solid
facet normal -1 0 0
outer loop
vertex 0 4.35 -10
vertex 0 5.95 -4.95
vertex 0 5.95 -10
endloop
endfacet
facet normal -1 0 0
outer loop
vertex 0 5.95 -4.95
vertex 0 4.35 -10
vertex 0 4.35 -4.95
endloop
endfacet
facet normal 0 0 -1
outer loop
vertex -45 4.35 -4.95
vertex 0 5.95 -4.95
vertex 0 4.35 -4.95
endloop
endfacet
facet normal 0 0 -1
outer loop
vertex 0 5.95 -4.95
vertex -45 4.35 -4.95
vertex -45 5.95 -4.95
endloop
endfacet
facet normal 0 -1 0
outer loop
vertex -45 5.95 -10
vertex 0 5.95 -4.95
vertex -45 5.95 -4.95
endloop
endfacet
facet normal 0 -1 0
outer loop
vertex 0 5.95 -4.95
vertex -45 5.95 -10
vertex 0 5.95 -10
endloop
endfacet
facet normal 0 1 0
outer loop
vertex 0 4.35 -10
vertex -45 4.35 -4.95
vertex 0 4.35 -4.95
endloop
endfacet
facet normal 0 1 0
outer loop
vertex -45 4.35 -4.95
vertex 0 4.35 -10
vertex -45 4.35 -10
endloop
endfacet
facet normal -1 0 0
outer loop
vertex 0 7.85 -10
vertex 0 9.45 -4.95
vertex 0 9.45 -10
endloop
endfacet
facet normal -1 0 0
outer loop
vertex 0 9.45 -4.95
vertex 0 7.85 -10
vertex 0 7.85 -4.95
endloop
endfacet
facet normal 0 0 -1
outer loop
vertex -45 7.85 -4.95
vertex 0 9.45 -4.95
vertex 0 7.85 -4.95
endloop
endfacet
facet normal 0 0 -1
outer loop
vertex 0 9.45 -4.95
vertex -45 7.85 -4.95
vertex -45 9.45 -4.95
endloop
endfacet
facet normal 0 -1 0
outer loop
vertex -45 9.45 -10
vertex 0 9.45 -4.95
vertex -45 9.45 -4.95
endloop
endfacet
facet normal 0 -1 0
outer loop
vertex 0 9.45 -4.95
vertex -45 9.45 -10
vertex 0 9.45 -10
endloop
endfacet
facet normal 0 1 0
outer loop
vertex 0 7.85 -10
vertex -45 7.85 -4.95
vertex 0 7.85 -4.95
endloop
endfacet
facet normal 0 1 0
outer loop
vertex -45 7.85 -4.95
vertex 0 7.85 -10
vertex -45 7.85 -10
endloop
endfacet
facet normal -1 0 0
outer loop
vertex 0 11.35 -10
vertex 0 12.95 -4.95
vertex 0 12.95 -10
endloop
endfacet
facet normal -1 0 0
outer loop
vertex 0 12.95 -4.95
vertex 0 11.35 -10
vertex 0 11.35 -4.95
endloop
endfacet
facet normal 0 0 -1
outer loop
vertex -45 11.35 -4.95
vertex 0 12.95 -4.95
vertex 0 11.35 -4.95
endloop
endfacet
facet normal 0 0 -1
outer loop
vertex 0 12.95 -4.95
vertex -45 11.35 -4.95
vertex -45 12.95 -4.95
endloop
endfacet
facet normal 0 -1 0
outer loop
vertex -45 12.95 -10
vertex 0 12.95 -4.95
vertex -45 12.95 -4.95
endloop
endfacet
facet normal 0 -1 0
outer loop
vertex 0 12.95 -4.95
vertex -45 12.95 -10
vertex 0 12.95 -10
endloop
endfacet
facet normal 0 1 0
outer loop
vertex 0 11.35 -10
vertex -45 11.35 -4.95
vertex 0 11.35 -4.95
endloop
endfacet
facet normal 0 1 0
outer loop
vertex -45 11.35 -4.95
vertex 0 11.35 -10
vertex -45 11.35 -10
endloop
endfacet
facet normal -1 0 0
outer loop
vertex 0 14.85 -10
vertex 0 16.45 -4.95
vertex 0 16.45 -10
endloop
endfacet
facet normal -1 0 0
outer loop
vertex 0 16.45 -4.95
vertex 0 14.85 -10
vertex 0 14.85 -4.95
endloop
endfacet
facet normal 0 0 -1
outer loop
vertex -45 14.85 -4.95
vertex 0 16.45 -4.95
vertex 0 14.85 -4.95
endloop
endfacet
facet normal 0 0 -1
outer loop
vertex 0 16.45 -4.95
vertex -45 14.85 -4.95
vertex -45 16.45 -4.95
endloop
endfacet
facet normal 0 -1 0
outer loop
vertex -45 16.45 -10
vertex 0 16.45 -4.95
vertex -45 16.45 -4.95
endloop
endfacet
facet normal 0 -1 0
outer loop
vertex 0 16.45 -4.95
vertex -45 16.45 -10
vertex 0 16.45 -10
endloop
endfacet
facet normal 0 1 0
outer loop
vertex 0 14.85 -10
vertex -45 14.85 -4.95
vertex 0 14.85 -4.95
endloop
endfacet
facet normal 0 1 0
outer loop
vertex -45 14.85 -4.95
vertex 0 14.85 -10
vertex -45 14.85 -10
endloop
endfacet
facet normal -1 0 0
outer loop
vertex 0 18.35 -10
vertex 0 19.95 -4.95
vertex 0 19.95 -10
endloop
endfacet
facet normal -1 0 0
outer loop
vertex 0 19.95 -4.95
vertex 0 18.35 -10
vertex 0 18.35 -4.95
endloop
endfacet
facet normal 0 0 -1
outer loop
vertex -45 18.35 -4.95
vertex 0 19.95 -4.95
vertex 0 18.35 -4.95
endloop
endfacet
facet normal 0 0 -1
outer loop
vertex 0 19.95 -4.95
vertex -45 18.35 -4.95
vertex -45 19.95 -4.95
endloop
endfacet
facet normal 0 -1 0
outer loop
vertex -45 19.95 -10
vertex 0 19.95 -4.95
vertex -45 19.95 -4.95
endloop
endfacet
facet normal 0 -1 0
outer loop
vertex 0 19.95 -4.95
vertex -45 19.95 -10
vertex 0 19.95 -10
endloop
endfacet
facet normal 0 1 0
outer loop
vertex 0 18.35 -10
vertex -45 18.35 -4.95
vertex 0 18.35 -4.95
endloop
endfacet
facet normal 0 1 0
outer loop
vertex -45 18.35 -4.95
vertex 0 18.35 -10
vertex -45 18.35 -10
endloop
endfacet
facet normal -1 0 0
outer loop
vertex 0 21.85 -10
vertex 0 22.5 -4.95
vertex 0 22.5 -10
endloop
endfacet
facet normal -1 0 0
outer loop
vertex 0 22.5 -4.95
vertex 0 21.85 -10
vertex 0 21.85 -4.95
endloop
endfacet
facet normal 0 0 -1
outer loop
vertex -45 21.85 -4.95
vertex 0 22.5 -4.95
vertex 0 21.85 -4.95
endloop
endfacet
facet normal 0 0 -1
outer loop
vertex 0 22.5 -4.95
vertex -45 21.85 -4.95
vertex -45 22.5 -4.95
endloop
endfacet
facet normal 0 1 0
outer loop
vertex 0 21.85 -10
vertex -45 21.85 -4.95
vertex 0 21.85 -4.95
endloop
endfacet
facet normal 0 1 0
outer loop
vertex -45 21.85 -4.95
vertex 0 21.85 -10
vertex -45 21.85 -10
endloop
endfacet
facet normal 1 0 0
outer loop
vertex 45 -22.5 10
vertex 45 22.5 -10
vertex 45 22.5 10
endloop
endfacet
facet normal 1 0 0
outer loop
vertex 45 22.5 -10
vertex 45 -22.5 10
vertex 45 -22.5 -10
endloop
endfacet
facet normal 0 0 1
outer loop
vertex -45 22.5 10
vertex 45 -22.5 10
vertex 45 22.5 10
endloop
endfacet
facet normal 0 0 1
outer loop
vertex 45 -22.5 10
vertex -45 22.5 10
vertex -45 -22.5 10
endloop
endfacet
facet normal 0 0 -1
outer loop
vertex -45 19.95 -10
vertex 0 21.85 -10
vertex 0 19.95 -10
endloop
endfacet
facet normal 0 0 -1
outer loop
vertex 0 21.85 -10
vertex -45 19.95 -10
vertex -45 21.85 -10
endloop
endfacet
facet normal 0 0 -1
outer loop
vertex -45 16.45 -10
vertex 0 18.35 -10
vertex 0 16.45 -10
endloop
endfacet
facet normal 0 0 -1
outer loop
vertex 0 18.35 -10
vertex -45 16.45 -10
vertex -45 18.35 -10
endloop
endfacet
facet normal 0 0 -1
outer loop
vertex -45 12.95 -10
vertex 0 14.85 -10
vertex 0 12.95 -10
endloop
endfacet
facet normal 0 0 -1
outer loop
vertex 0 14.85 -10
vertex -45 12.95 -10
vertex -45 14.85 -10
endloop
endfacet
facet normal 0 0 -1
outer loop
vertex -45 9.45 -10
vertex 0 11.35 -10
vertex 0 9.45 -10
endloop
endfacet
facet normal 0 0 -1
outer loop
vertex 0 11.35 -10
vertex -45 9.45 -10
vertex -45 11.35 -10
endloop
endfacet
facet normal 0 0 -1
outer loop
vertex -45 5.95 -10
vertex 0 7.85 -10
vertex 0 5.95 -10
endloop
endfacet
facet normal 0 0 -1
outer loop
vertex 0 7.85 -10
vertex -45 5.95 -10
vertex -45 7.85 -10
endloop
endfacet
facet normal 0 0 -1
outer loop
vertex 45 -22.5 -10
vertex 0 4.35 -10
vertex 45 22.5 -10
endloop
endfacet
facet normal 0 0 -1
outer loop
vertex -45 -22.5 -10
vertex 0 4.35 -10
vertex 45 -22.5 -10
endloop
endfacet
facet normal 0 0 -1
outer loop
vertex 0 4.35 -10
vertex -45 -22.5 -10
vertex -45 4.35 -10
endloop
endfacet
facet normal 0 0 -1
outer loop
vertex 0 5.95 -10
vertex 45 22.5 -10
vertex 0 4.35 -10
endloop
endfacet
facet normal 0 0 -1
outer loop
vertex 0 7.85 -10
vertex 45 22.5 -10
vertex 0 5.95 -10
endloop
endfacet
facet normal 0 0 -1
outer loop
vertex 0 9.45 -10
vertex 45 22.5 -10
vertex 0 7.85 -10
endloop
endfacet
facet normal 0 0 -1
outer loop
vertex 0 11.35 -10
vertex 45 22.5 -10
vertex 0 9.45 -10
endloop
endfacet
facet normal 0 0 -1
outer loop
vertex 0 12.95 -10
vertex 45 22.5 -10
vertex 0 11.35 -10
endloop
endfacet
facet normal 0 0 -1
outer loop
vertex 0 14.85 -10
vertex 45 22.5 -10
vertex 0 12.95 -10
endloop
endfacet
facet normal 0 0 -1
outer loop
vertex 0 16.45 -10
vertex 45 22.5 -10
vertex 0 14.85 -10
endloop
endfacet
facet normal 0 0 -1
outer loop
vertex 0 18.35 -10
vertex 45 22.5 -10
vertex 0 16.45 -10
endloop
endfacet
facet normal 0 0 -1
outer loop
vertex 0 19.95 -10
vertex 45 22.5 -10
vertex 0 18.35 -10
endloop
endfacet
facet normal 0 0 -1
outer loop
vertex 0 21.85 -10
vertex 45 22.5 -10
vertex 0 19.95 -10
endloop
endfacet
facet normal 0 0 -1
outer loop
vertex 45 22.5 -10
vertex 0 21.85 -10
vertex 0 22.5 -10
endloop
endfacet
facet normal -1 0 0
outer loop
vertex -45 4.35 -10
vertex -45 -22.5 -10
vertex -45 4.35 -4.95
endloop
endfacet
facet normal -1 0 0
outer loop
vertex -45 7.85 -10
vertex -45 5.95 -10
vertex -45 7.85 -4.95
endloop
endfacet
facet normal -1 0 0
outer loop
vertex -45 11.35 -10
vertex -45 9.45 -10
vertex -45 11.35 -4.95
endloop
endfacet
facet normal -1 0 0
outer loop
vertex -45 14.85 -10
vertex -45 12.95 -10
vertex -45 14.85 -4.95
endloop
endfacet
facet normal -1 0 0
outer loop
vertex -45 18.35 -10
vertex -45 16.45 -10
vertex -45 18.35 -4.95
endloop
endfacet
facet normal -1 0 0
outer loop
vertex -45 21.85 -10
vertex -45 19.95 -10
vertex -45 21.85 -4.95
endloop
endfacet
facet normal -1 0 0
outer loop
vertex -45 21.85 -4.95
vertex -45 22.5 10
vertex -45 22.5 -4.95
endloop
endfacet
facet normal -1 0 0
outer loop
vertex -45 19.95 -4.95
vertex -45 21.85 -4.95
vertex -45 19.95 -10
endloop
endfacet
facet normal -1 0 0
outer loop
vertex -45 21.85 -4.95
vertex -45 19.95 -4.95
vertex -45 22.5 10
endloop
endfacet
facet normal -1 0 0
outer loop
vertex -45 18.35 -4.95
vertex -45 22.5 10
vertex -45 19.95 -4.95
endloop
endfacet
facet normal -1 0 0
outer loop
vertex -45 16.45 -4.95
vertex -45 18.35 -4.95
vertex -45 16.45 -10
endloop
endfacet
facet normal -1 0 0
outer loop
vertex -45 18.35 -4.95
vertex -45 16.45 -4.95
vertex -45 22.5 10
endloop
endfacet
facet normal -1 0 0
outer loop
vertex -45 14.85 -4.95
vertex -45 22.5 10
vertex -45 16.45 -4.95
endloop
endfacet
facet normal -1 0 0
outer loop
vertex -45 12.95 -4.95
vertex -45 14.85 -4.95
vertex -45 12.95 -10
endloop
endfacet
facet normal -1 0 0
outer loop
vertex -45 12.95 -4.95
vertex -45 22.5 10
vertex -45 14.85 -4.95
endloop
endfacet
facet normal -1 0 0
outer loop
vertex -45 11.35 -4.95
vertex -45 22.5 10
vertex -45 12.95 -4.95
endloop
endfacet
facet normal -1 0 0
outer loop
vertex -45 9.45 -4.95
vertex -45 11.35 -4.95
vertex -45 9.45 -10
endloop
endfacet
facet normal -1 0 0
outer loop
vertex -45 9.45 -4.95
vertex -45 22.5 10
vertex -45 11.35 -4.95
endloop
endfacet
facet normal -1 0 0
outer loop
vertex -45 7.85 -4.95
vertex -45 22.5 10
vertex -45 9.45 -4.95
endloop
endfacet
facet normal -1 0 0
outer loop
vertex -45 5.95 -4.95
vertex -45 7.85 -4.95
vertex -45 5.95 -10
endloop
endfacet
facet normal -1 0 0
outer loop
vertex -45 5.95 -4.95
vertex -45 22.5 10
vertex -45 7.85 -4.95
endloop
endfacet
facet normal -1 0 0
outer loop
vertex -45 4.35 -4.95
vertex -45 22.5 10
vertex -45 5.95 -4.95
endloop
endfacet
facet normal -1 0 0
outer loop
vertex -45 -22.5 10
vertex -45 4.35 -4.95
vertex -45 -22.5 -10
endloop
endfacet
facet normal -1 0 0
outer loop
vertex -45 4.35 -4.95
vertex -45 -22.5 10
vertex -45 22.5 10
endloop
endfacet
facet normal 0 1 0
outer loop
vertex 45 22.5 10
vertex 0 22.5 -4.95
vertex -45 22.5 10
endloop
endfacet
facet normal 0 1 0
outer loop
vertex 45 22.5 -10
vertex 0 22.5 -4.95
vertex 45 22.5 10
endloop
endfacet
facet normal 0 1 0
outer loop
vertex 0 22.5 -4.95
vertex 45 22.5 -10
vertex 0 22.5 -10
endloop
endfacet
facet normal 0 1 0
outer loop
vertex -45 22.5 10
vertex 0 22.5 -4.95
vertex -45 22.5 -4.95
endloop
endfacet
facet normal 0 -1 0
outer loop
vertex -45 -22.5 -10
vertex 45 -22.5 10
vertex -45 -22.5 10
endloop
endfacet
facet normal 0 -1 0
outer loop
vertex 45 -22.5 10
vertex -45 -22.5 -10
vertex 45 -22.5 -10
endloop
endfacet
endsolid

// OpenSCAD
$fn = 64;

// Dimensions
block_length_x = 90;
block_width_y = 45;
block_height_z = 20;

slot_length_x = 77;
slot_width_y = 1.6;
slot_depth_z = 10;

slot_spacing_y = 3.5;

// Derived Dimensions
// Calculate offset from center to place slots symmetrically
// Total width of slots = (slots - 1) * spacing
// Offset = (Total width / 2) + (Slot width / 2)
num_slots = 10;
total_slot_width = (num_slots - 1) * slot_spacing_y;
slot_offset_y = (total_slot_width / 2) + (slot_width_y / 2);

module base_block() {
    cube([block_length_x, block_width_y, block_height_z], center=true);
}

module slot_cutout() {
    // Translate to the edge of the block in Y
    // We cut from the center, so we move half the block width
    translate([0, block_width_y / 2, 0]) {
        // Cut the slot
        translate([-slot_length_x / 2, -slot_width_y / 2, -slot_depth_z]) {
            cube([slot_length_x, slot_width_y, slot_depth_z + 0.1], center=true);
        }
    }
}

module drying_rack() {
    difference() {
        base_block();
        
        // Create 10 slots centered in X and Y
        for (i = [0 : num_slots - 1]) {
            // Calculate Y position for each slot
            // Center of the block is 0. 
            // Slot i is at i * spacing.
            // We need to account for the offset calculated earlier.
            y_pos = (i * slot_spacing_y) - slot_offset_y;
            
            translate([0, y_pos, 0]) {
                slot_cutout();
            }
        }
    }
}

drying_rack();
